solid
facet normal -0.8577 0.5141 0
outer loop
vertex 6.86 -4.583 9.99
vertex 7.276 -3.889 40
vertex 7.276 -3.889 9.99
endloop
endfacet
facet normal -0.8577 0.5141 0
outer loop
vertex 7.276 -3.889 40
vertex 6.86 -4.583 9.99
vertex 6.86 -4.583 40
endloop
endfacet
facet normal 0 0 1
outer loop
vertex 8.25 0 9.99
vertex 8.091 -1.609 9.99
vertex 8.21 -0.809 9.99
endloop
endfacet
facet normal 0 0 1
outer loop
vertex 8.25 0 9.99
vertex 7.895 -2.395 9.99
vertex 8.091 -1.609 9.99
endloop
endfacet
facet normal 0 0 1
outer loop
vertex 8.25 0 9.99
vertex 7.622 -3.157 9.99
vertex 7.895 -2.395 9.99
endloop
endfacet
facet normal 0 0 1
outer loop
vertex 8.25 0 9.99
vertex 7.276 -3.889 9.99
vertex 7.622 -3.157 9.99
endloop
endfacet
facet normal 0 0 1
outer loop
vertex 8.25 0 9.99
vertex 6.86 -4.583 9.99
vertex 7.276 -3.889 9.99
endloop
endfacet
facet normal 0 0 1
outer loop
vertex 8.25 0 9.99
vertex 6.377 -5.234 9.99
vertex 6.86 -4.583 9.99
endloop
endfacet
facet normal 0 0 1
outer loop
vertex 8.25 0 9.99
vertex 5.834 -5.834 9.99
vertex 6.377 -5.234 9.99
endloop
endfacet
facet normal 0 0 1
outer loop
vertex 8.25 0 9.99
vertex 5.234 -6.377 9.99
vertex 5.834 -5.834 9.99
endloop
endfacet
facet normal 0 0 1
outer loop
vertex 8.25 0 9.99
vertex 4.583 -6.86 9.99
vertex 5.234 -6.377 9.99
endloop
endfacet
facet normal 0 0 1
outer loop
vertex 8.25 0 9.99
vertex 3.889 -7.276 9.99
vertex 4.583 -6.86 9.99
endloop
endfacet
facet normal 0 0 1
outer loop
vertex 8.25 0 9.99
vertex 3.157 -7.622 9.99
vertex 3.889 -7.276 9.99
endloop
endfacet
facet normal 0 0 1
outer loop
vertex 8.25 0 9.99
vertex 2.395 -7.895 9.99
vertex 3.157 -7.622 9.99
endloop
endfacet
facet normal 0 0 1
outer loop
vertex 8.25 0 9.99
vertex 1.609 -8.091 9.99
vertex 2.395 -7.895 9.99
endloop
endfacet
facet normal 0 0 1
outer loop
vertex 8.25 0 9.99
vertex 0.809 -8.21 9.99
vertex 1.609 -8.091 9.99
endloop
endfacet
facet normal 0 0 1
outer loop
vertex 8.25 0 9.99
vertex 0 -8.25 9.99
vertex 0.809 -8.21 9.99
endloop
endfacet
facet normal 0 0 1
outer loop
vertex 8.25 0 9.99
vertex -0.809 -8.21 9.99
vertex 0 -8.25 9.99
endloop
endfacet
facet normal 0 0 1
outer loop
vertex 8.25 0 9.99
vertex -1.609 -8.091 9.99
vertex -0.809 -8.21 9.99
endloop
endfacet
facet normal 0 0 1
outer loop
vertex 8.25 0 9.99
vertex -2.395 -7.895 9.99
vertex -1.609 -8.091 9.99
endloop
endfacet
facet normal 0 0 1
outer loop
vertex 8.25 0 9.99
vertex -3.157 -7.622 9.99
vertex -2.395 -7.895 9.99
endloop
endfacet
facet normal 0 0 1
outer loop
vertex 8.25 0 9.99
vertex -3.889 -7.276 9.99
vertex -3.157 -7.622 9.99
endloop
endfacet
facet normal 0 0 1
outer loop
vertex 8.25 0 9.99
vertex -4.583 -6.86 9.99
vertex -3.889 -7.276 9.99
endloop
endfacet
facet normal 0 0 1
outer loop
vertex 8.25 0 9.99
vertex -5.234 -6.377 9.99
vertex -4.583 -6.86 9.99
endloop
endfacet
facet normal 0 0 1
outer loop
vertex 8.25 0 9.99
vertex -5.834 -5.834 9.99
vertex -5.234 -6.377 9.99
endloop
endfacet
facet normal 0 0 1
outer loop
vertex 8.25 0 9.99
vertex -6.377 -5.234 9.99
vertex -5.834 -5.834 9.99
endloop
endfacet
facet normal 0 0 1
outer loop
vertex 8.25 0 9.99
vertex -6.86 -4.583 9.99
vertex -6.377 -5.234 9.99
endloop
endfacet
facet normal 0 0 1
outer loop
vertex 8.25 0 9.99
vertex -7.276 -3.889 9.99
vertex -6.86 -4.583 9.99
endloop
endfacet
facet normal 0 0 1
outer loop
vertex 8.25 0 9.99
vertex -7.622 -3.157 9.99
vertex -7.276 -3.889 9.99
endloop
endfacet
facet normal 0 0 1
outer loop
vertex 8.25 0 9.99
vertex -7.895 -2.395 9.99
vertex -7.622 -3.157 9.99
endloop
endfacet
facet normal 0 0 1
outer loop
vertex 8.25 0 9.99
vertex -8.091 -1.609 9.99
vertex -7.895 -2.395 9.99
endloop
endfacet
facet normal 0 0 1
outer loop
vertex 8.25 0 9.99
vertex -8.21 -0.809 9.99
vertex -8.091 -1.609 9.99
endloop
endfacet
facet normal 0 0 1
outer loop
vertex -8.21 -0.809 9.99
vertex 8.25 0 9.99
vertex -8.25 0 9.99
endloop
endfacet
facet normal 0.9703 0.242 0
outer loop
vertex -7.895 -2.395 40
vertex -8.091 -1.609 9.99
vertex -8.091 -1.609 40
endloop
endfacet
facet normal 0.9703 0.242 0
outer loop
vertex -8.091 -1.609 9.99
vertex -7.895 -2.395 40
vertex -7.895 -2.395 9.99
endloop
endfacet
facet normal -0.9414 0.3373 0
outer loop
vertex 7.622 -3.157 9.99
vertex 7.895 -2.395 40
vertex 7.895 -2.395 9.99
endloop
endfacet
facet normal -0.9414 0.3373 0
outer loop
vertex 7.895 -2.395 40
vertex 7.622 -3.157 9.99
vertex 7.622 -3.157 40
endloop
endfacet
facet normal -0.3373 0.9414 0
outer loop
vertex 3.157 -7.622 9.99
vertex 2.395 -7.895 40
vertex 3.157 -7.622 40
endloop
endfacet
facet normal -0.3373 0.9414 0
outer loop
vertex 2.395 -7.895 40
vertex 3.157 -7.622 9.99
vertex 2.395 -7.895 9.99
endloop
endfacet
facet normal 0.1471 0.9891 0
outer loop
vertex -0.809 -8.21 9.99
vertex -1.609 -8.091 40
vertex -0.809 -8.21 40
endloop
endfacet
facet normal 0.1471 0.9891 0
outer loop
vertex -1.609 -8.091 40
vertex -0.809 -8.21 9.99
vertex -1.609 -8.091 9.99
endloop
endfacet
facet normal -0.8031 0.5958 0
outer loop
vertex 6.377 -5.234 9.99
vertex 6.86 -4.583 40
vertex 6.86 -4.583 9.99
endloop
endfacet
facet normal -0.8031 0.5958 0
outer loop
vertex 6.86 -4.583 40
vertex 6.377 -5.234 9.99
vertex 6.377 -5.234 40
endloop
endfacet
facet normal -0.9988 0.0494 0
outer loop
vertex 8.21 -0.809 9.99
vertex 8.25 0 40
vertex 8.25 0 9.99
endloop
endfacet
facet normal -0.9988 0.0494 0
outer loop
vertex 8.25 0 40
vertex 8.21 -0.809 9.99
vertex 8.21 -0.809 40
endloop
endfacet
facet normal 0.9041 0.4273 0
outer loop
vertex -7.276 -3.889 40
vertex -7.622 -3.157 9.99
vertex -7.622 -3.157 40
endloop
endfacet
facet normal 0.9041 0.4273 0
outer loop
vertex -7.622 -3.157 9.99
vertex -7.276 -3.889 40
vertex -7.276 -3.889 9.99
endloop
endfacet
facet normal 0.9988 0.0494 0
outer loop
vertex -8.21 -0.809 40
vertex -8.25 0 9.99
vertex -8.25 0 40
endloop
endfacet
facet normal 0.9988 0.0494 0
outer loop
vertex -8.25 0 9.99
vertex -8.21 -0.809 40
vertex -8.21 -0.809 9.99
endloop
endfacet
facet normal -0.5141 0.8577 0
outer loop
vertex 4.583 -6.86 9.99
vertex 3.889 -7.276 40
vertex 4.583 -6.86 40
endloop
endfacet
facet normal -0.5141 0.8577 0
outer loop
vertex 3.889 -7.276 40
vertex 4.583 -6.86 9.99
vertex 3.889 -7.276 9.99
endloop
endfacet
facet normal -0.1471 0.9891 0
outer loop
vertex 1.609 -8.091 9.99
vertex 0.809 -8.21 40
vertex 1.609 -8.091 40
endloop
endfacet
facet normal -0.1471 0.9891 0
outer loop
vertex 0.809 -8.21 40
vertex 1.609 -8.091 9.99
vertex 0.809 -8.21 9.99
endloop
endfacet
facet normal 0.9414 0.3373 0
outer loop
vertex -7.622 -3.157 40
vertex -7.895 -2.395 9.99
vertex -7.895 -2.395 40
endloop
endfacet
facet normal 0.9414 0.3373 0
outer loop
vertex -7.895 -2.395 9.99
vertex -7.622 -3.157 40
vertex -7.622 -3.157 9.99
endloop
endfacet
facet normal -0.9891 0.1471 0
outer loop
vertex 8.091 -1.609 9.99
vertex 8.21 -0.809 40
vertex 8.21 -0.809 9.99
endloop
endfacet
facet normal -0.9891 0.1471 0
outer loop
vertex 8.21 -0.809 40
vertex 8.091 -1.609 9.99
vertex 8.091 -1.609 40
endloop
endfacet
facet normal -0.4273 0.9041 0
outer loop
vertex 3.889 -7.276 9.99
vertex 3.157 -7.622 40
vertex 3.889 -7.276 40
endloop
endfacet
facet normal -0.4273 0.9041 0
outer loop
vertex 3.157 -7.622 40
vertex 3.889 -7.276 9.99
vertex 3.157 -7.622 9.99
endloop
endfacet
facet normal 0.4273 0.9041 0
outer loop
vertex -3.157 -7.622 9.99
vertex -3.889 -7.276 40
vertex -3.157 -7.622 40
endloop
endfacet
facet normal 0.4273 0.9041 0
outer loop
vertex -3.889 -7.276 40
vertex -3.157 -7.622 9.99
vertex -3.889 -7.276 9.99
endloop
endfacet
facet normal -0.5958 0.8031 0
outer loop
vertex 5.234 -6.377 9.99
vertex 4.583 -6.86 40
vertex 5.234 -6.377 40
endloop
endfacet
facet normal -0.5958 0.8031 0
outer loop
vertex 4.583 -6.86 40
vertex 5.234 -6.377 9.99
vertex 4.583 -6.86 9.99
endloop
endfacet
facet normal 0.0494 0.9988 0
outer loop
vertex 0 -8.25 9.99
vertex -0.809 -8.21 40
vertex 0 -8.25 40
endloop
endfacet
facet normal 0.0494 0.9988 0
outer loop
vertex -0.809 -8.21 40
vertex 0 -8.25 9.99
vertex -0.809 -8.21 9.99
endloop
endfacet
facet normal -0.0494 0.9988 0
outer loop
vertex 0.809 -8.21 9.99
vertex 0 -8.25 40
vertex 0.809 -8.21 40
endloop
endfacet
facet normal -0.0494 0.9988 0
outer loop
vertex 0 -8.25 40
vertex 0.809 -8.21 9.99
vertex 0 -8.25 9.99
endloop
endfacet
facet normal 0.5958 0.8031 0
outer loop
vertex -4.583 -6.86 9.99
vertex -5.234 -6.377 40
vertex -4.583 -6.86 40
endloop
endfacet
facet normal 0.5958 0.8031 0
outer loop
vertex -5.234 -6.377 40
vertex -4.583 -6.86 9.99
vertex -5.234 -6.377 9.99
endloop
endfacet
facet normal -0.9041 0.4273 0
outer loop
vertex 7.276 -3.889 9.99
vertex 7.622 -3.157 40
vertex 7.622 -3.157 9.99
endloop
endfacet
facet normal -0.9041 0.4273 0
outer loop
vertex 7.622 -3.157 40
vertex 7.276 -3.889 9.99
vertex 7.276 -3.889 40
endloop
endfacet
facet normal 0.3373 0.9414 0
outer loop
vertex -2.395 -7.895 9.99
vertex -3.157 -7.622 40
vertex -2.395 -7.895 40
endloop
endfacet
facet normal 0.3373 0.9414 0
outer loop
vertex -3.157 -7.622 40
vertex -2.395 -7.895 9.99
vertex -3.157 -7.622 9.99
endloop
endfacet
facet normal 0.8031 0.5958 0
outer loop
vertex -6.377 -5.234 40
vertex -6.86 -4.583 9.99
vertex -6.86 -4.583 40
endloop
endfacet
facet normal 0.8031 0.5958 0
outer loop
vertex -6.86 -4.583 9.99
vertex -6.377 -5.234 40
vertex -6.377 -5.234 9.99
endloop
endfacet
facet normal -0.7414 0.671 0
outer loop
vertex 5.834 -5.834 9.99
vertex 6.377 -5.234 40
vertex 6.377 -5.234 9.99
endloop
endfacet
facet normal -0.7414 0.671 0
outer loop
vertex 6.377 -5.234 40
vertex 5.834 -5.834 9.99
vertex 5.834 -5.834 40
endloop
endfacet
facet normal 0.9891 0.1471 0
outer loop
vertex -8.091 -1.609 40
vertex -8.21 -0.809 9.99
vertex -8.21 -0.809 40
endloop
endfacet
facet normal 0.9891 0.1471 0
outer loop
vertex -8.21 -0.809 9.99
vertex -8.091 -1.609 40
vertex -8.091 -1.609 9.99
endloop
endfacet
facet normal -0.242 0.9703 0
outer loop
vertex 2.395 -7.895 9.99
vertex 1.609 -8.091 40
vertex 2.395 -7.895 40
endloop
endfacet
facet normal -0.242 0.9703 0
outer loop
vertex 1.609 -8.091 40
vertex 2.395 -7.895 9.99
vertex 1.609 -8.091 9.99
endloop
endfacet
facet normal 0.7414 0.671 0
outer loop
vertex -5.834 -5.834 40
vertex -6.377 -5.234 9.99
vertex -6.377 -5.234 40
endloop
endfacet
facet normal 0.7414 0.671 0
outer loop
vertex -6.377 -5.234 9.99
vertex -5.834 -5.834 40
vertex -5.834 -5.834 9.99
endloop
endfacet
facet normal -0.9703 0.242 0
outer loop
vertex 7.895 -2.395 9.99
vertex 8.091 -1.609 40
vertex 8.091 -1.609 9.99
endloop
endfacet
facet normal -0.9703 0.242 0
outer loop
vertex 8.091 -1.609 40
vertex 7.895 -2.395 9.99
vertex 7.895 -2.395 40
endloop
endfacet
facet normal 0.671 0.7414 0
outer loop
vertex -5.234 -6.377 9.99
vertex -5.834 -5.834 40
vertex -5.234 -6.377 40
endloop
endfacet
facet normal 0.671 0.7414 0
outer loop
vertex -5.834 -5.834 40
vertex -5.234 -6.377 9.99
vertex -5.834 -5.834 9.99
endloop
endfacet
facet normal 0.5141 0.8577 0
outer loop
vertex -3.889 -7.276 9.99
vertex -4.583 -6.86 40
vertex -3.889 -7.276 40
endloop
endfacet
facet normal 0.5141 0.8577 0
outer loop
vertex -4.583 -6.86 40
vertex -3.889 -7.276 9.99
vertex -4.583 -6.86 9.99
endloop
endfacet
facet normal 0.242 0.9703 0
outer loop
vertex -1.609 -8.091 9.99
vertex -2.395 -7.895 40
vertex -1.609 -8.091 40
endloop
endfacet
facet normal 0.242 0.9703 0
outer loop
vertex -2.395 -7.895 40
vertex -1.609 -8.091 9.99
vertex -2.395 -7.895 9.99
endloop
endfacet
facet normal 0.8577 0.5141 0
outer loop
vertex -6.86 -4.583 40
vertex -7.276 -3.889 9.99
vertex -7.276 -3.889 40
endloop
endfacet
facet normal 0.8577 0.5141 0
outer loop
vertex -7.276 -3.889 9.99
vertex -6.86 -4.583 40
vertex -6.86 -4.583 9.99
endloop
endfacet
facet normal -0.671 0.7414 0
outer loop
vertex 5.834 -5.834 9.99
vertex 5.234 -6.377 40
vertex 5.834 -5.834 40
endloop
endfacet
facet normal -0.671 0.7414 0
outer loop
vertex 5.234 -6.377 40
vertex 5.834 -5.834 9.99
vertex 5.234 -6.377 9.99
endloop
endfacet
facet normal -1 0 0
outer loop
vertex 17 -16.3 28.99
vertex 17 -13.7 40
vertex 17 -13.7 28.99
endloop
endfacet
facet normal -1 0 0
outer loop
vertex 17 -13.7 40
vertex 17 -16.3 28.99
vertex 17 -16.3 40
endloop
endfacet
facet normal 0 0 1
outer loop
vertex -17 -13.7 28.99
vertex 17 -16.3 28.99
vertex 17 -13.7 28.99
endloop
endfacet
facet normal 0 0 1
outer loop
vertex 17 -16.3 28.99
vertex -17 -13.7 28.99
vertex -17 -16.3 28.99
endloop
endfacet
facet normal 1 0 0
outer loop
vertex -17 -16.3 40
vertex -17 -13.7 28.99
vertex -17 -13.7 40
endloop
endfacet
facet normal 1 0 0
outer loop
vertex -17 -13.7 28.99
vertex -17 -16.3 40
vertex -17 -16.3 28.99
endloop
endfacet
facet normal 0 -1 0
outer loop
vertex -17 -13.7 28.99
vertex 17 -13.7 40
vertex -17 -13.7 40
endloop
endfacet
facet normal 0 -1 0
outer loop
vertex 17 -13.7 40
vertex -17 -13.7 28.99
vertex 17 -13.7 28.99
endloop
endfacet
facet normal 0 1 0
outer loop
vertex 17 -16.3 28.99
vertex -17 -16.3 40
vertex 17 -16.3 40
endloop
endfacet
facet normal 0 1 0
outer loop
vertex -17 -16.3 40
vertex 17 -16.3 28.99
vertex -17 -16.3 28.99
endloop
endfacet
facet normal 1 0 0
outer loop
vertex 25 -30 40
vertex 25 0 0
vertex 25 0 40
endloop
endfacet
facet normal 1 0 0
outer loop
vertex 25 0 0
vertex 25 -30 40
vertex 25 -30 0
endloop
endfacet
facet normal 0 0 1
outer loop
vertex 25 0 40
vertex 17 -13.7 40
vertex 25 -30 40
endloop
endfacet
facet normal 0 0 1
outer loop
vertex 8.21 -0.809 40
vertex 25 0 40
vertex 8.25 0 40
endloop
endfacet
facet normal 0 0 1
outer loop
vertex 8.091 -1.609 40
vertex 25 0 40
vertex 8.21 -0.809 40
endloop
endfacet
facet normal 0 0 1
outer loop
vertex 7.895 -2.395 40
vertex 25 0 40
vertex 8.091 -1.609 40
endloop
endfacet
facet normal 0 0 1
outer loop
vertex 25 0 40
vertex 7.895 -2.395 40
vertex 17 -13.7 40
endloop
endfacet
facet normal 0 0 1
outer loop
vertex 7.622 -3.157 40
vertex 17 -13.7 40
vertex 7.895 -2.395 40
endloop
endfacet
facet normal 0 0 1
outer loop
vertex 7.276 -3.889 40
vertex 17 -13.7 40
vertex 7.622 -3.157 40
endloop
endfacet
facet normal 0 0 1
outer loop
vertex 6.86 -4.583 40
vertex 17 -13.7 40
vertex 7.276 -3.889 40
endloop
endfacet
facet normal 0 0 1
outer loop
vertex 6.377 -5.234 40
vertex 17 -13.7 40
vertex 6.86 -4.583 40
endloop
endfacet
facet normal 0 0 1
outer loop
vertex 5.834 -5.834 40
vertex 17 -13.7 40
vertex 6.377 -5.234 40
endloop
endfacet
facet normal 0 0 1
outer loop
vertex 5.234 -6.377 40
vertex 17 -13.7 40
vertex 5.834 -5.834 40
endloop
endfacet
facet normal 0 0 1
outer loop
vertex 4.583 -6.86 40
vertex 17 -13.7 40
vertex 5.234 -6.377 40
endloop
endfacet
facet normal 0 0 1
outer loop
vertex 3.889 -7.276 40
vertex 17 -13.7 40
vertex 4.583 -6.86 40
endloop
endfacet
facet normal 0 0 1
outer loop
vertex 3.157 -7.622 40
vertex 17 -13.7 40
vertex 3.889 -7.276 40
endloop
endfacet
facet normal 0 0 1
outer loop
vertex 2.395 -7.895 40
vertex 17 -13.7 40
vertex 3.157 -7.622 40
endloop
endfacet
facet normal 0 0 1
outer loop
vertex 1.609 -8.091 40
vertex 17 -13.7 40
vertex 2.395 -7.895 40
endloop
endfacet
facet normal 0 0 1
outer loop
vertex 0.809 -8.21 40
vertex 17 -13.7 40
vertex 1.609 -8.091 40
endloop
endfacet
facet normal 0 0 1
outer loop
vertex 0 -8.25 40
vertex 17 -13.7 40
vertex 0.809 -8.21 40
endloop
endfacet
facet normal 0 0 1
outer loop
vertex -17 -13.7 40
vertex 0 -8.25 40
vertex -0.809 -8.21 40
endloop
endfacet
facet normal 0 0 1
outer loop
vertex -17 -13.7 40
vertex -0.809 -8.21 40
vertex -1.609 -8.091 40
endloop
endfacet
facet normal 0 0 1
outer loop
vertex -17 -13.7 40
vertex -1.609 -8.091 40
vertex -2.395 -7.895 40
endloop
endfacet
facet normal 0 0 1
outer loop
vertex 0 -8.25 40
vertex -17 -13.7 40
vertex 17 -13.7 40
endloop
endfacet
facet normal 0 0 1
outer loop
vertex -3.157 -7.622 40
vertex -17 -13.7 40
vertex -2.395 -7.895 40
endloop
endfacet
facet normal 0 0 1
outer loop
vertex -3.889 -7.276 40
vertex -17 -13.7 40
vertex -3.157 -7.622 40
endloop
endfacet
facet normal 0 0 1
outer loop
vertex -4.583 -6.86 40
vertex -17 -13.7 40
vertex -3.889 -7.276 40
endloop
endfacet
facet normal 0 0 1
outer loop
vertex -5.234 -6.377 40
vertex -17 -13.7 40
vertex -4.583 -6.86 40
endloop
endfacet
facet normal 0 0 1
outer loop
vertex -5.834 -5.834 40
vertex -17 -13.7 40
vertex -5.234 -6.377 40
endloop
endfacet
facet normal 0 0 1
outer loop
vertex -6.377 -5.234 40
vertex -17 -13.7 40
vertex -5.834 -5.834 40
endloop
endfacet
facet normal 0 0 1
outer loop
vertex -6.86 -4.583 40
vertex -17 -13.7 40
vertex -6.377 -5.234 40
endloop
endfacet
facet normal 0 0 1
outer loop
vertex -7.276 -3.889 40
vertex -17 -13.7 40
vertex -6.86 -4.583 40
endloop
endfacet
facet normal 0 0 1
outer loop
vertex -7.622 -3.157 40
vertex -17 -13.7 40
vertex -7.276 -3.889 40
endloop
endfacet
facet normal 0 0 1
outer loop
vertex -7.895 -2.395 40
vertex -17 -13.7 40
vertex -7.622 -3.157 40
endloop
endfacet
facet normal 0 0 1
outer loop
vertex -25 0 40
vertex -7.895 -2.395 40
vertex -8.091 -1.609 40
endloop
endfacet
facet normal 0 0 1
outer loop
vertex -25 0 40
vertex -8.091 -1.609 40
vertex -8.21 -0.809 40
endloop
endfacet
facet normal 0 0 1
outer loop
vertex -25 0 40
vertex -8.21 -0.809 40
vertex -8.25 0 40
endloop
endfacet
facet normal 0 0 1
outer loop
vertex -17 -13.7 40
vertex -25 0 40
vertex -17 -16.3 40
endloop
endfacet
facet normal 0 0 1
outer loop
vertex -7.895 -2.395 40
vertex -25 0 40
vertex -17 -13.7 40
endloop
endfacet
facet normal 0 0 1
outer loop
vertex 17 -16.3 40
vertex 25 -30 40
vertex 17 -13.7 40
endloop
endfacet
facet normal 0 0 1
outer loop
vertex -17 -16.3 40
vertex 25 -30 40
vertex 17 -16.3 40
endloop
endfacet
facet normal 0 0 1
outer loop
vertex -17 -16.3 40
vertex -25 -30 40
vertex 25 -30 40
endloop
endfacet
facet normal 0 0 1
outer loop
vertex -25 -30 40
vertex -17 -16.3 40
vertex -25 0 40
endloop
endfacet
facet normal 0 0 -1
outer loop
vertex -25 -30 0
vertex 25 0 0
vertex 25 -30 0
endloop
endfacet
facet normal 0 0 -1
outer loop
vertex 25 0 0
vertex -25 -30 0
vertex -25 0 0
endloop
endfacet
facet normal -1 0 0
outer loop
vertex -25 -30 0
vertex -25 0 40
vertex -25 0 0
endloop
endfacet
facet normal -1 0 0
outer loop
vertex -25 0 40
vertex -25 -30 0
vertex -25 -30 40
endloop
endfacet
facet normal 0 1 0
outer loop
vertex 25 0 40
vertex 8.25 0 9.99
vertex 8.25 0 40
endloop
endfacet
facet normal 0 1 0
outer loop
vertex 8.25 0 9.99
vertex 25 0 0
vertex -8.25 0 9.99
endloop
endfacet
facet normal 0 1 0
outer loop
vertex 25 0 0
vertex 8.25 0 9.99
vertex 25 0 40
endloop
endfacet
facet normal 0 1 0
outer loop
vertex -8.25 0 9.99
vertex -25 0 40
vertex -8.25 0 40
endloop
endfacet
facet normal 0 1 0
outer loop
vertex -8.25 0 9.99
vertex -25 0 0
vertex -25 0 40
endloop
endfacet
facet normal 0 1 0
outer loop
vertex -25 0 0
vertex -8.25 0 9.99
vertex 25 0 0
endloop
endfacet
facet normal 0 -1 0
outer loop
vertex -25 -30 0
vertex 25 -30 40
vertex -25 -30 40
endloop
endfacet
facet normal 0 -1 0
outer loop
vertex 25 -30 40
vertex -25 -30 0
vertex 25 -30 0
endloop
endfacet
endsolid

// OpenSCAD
// Built by bench/smallmodels/features/compiler.py from a list of features.
$fn = 64;
difference() {
  union() {
    translate([0, -15, 0]) translate([-25, -15, 0]) cube([50, 30, 40]);
  }
  union() {
    translate([0, 0, 9.99]) rotate([0, 0, 0]) cylinder(d = 16.5, h = 30.02);
    translate([0, -15, 28.99]) rotate([0, 0, 0]) translate([-17, -1.3, 0]) cube([34, 2.6, 11.02]);
  }
}
